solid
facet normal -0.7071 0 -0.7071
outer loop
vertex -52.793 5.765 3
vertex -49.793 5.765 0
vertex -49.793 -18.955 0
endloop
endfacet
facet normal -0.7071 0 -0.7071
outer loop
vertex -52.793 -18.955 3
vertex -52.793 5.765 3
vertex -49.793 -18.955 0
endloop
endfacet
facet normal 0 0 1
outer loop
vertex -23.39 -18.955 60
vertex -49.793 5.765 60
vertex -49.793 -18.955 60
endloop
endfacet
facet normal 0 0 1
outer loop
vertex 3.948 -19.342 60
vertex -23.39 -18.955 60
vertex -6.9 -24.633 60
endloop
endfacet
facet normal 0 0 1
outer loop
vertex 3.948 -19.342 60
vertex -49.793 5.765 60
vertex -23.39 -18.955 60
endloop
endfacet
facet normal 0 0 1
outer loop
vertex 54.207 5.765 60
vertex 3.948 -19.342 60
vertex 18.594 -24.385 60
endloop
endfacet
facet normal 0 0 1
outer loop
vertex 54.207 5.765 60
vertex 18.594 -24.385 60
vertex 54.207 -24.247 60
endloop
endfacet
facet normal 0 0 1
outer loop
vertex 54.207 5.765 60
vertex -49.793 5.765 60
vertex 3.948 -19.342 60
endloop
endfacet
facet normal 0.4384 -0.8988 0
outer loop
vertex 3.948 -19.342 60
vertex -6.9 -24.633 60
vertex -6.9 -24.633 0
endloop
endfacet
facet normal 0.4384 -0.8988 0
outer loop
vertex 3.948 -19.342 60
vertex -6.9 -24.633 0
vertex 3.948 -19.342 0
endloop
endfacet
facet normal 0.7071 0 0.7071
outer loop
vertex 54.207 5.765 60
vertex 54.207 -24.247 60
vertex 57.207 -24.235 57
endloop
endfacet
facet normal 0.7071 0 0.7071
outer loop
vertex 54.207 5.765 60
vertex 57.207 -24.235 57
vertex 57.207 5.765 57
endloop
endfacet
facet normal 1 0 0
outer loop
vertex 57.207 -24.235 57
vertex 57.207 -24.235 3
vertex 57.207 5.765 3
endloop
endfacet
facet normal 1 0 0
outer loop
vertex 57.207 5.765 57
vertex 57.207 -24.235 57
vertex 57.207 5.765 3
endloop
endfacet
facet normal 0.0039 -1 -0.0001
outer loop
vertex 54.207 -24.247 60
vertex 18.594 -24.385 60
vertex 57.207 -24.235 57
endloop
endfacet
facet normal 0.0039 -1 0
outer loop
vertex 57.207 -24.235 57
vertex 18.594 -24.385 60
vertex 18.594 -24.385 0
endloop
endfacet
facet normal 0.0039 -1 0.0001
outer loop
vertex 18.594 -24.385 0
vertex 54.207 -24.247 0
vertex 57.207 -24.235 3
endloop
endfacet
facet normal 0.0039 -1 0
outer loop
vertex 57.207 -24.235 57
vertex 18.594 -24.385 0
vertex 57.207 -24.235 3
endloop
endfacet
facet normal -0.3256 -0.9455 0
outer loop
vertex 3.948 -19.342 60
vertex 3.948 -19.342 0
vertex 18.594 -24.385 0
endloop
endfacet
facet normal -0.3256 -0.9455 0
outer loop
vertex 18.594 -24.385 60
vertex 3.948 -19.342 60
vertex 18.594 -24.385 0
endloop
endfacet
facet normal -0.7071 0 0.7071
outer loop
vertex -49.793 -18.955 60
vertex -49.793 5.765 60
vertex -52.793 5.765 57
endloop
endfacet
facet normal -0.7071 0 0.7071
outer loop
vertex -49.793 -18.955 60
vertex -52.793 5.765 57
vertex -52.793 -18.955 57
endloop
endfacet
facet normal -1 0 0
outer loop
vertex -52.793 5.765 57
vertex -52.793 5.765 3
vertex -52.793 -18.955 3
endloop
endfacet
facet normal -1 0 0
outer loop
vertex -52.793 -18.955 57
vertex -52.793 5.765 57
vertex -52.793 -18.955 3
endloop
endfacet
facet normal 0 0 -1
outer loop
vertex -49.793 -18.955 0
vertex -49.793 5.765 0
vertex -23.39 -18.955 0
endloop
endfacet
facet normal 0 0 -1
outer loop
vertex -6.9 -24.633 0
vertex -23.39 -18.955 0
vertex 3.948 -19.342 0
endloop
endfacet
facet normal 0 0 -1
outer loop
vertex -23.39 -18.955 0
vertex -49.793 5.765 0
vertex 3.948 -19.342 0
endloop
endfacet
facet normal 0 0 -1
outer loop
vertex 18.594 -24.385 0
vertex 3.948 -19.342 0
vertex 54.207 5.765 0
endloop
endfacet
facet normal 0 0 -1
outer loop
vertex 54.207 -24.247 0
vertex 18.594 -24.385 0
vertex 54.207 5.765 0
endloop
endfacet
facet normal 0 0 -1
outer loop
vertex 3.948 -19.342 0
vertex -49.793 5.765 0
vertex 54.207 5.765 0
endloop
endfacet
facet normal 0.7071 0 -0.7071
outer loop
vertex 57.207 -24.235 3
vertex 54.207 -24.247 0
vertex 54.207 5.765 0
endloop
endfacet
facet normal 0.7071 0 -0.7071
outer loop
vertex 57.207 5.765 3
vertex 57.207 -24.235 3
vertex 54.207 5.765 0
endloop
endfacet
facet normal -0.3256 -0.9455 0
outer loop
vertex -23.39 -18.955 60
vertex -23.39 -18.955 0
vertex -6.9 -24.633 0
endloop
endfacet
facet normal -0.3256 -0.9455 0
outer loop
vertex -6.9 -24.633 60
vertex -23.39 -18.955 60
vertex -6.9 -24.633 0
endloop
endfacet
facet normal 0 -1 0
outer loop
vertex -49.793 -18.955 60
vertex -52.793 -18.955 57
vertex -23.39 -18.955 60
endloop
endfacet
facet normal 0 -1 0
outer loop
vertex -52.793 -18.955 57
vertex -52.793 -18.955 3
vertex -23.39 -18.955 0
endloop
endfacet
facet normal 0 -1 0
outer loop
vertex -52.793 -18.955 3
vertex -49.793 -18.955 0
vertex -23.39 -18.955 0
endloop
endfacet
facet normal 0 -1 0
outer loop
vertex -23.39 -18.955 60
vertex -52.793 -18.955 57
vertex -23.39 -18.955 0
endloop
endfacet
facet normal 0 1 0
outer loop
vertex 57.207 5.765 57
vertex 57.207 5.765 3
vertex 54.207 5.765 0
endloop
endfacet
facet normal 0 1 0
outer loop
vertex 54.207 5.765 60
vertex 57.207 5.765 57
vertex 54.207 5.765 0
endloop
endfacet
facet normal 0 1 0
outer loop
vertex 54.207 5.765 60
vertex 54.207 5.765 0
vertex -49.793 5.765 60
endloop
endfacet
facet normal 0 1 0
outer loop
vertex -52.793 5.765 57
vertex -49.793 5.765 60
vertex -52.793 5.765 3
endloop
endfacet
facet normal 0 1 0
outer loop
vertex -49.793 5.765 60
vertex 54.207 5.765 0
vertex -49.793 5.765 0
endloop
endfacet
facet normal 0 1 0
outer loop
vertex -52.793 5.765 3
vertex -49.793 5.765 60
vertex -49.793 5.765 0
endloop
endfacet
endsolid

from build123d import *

# Parameters (mm, degrees)
F1_DEPTH = 60
F2_SIZE  = 3


with BuildPart() as f1:
    # F0 (on Top) → F1 (new body)
    with BuildSketch(Plane.XY):
        Polygon((57.207322, 5.764956), (-52.792678, 5.764956), (-52.792678, -18.955044), (-23.39, -18.955044), (-6.900156, -24.632953), (3.948288, -19.341813), (18.594371, -24.384864), (57.207322, -24.235044), align=None)
    extrude(amount=F1_DEPTH)

    # F2
    f2_edges = [f1.edges().sort_by_distance(p)[0] for p in [
        (-52.792678, -6.595044, 60),
        (-52.792678, -6.595044, 0),
        (57.207322, -9.235044, 60),
        (57.207322, -9.235044, 0),
    ]]
    chamfer(f2_edges, length=F2_SIZE)


solid = f1.part
